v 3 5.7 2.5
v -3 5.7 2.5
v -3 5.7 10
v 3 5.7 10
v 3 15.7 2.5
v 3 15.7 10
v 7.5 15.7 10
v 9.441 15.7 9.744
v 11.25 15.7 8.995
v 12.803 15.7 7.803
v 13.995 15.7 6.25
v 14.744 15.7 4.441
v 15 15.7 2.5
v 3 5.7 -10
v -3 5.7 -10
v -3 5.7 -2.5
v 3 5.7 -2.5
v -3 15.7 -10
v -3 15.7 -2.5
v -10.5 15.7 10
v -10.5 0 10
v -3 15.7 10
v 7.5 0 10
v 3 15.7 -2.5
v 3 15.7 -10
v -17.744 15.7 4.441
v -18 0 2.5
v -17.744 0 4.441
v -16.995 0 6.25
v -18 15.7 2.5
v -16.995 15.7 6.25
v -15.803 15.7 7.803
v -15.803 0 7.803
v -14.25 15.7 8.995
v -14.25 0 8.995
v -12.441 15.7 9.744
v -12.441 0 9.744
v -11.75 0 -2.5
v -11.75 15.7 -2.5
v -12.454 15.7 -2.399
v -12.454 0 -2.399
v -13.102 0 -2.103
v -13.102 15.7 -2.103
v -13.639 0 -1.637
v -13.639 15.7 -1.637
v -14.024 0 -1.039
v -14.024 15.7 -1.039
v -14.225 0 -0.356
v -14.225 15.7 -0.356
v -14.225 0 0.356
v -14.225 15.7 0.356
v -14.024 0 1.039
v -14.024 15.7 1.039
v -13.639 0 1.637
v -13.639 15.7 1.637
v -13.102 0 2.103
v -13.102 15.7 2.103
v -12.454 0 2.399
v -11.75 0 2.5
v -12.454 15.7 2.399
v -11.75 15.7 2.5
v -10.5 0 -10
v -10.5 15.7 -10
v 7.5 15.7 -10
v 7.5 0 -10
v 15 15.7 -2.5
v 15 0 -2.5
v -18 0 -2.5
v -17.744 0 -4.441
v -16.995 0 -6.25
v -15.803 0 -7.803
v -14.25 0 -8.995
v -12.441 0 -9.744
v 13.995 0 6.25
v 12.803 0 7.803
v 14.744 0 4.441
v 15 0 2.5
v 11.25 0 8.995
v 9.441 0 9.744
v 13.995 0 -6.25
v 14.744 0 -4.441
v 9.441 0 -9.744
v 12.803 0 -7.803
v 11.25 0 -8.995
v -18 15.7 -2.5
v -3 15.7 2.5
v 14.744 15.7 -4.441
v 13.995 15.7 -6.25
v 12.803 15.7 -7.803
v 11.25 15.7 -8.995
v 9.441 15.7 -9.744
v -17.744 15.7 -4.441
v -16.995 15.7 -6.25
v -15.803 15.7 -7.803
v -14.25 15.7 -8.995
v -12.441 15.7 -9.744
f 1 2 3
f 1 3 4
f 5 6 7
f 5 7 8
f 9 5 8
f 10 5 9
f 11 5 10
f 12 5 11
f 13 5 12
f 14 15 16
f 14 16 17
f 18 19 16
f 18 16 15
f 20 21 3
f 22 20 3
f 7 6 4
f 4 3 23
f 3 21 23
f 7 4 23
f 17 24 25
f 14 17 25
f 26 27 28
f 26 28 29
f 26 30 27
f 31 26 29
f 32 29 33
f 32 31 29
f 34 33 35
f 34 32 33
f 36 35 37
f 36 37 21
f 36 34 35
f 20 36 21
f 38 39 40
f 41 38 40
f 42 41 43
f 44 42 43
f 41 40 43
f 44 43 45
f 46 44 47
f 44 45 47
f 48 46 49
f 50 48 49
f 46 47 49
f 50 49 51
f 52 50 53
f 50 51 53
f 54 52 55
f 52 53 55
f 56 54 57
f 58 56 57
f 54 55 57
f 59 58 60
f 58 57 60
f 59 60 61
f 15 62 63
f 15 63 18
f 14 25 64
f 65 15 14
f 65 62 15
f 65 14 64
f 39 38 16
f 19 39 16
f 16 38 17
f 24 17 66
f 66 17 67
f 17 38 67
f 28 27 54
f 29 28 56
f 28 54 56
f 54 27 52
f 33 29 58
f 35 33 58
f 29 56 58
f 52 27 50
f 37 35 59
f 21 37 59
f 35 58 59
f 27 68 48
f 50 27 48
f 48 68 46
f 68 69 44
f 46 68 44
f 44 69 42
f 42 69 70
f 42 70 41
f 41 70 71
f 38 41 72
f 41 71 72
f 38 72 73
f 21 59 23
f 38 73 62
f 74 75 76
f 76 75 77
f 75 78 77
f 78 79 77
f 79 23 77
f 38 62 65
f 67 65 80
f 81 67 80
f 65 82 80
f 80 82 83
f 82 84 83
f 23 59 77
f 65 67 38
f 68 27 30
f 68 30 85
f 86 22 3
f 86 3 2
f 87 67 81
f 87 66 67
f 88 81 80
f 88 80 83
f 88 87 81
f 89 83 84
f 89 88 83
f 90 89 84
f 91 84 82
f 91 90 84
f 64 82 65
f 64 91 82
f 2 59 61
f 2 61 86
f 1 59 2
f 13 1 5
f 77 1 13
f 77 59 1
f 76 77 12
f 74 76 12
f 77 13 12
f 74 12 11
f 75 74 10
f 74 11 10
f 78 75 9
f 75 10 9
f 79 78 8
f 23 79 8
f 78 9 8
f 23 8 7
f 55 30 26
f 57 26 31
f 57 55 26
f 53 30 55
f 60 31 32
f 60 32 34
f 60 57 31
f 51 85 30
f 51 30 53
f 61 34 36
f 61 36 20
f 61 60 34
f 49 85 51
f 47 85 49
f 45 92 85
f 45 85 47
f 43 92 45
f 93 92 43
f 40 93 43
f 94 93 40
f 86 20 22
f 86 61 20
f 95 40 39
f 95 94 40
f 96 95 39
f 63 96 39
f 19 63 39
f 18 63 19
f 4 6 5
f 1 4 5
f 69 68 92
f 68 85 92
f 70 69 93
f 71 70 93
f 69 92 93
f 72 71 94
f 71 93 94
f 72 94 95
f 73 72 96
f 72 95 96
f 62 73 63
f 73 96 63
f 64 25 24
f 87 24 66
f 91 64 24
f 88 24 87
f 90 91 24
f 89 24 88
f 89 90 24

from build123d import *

# Parameters (mm, degrees)
CROQUIS1_W              = 33
CROQUIS1_H              = 20
SALIENTE_EXTRUIR1_DEPTH = 15.7
CORTAR_EXTRUIR1_REACH   = 27.894
CROQUIS2_R              = 2.5
CROQUIS6_W              = 6
CROQUIS6_H              = 20
CORTAR_EXTRUIR2_DEPTH   = 10
CORTAR_EXTRUIR3_START   = -15.7
CROQUIS7_W              = 26.75
CROQUIS7_H              = 5
CORTAR_EXTRUIR3_DEPTH   = 15.7
REDONDEO1_R             = 7.5


with BuildPart() as part:
    # Croquis1 → Saliente-Extruir1 (new body)
    with BuildSketch(Plane(origin=(0, 0, 0), x_dir=(1, 0, 0), z_dir=(0, 1, 0))):
        with Locations((-1.5, 0)):
            Rectangle(CROQUIS1_W, CROQUIS1_H)
    extrude(amount=SALIENTE_EXTRUIR1_DEPTH)

    # Croquis2 → Cortar-Extruir1 (cut, up to next)
    with BuildSketch(Plane(origin=(0, 15.7, 0), x_dir=(1, 0, 0), z_dir=(0, 1, 0)), mode=Mode.PRIVATE) as cortar_extruir1_sk1:
        with Locations(Location((11.75, 0, 0), (0, 0, 270))):
            Circle(CROQUIS2_R)
    cortar_extruir1_tool1 = extrude(cortar_extruir1_sk1.sketch, amount=-CORTAR_EXTRUIR1_REACH, mode=Mode.PRIVATE) & part.part
    # Croquis2 → Cortar-Extruir1 (cut, up to next)
    with BuildSketch(Plane(origin=(0, 15.7, 0), x_dir=(1, 0, 0), z_dir=(0, 1, 0)), mode=Mode.PRIVATE) as cortar_extruir1_sk2:
        with Locations(Location((-11.75, 0, 0), (0, 0, 270))):
            Circle(CROQUIS2_R)
    cortar_extruir1_tool2 = extrude(cortar_extruir1_sk2.sketch, amount=-CORTAR_EXTRUIR1_REACH, mode=Mode.PRIVATE) & part.part
    add(cortar_extruir1_tool1.solids().sort_by_distance((11.75, 15.7, 0))[0], mode=Mode.SUBTRACT)
    add(cortar_extruir1_tool2.solids().sort_by_distance((-11.75, 15.7, 0))[0], mode=Mode.SUBTRACT)

    # Croquis6 → Cortar-Extruir2 (cut)
    with BuildSketch(Plane(origin=(0, 15.7, 0), x_dir=(1, 0, 0), z_dir=(0, 1, 0))):
        Rectangle(CROQUIS6_W, CROQUIS6_H)
    extrude(amount=-CORTAR_EXTRUIR2_DEPTH, mode=Mode.SUBTRACT)

    # Croquis7 → Cortar-Extruir3 (cut)
    with BuildSketch(Plane(origin=(0, 15.7, 0), x_dir=(1, 0, 0), z_dir=(0, 1, 0)).offset(CORTAR_EXTRUIR3_START)):
        with Locations((1.625, 0)):
            Rectangle(CROQUIS7_W, CROQUIS7_H)
    extrude(amount=CORTAR_EXTRUIR3_DEPTH, mode=Mode.SUBTRACT)

    # Redondeo1
    redondeo1_edges = [part.edges().sort_by_distance(p)[0] for p in [
        (-18, 7.85, -10),
        (-18, 7.85, 10),
        (15, 7.85, -10),
        (15, 7.85, 10),
    ]]
    fillet(redondeo1_edges, radius=REDONDEO1_R - 0.0001)  # a hair under: the kernel refuses the full size


solid = part.part
